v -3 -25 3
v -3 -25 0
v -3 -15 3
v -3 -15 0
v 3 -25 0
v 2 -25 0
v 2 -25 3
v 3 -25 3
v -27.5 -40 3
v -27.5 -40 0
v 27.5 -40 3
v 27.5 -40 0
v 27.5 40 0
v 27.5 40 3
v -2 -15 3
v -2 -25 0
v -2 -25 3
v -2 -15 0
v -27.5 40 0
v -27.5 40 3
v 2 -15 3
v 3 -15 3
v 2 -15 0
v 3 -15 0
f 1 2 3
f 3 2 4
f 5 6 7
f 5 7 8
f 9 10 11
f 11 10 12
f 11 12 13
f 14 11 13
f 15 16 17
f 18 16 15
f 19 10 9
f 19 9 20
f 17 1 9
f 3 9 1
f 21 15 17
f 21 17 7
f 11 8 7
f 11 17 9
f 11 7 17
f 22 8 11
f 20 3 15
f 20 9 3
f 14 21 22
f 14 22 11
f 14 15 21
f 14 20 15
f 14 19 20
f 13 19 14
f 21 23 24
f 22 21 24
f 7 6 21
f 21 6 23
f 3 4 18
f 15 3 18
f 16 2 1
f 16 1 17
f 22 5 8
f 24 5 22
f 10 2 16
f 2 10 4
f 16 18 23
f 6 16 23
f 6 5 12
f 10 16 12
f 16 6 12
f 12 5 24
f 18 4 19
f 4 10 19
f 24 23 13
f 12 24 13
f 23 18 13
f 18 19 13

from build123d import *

# Parameters (mm, degrees)
SKETCH1_W           = 55
SKETCH1_H           = 80
SKETCH1_W_2         = 1
SKETCH1_H_2         = 10
BOSS_EXTRUDE1_DEPTH = 3


with BuildPart() as part:
    # Sketch1 → Boss-Extrude1 (new body)
    with BuildSketch(Plane.XY):
        Rectangle(SKETCH1_W, SKETCH1_H)
        with Locations((2.5, -20)):
            Rectangle(SKETCH1_W_2, SKETCH1_H_2, mode=Mode.SUBTRACT)
        with Locations((-2.5, -20)):
            Rectangle(SKETCH1_W_2, SKETCH1_H_2, mode=Mode.SUBTRACT)
    extrude(amount=BOSS_EXTRUDE1_DEPTH)


solid = part.part
